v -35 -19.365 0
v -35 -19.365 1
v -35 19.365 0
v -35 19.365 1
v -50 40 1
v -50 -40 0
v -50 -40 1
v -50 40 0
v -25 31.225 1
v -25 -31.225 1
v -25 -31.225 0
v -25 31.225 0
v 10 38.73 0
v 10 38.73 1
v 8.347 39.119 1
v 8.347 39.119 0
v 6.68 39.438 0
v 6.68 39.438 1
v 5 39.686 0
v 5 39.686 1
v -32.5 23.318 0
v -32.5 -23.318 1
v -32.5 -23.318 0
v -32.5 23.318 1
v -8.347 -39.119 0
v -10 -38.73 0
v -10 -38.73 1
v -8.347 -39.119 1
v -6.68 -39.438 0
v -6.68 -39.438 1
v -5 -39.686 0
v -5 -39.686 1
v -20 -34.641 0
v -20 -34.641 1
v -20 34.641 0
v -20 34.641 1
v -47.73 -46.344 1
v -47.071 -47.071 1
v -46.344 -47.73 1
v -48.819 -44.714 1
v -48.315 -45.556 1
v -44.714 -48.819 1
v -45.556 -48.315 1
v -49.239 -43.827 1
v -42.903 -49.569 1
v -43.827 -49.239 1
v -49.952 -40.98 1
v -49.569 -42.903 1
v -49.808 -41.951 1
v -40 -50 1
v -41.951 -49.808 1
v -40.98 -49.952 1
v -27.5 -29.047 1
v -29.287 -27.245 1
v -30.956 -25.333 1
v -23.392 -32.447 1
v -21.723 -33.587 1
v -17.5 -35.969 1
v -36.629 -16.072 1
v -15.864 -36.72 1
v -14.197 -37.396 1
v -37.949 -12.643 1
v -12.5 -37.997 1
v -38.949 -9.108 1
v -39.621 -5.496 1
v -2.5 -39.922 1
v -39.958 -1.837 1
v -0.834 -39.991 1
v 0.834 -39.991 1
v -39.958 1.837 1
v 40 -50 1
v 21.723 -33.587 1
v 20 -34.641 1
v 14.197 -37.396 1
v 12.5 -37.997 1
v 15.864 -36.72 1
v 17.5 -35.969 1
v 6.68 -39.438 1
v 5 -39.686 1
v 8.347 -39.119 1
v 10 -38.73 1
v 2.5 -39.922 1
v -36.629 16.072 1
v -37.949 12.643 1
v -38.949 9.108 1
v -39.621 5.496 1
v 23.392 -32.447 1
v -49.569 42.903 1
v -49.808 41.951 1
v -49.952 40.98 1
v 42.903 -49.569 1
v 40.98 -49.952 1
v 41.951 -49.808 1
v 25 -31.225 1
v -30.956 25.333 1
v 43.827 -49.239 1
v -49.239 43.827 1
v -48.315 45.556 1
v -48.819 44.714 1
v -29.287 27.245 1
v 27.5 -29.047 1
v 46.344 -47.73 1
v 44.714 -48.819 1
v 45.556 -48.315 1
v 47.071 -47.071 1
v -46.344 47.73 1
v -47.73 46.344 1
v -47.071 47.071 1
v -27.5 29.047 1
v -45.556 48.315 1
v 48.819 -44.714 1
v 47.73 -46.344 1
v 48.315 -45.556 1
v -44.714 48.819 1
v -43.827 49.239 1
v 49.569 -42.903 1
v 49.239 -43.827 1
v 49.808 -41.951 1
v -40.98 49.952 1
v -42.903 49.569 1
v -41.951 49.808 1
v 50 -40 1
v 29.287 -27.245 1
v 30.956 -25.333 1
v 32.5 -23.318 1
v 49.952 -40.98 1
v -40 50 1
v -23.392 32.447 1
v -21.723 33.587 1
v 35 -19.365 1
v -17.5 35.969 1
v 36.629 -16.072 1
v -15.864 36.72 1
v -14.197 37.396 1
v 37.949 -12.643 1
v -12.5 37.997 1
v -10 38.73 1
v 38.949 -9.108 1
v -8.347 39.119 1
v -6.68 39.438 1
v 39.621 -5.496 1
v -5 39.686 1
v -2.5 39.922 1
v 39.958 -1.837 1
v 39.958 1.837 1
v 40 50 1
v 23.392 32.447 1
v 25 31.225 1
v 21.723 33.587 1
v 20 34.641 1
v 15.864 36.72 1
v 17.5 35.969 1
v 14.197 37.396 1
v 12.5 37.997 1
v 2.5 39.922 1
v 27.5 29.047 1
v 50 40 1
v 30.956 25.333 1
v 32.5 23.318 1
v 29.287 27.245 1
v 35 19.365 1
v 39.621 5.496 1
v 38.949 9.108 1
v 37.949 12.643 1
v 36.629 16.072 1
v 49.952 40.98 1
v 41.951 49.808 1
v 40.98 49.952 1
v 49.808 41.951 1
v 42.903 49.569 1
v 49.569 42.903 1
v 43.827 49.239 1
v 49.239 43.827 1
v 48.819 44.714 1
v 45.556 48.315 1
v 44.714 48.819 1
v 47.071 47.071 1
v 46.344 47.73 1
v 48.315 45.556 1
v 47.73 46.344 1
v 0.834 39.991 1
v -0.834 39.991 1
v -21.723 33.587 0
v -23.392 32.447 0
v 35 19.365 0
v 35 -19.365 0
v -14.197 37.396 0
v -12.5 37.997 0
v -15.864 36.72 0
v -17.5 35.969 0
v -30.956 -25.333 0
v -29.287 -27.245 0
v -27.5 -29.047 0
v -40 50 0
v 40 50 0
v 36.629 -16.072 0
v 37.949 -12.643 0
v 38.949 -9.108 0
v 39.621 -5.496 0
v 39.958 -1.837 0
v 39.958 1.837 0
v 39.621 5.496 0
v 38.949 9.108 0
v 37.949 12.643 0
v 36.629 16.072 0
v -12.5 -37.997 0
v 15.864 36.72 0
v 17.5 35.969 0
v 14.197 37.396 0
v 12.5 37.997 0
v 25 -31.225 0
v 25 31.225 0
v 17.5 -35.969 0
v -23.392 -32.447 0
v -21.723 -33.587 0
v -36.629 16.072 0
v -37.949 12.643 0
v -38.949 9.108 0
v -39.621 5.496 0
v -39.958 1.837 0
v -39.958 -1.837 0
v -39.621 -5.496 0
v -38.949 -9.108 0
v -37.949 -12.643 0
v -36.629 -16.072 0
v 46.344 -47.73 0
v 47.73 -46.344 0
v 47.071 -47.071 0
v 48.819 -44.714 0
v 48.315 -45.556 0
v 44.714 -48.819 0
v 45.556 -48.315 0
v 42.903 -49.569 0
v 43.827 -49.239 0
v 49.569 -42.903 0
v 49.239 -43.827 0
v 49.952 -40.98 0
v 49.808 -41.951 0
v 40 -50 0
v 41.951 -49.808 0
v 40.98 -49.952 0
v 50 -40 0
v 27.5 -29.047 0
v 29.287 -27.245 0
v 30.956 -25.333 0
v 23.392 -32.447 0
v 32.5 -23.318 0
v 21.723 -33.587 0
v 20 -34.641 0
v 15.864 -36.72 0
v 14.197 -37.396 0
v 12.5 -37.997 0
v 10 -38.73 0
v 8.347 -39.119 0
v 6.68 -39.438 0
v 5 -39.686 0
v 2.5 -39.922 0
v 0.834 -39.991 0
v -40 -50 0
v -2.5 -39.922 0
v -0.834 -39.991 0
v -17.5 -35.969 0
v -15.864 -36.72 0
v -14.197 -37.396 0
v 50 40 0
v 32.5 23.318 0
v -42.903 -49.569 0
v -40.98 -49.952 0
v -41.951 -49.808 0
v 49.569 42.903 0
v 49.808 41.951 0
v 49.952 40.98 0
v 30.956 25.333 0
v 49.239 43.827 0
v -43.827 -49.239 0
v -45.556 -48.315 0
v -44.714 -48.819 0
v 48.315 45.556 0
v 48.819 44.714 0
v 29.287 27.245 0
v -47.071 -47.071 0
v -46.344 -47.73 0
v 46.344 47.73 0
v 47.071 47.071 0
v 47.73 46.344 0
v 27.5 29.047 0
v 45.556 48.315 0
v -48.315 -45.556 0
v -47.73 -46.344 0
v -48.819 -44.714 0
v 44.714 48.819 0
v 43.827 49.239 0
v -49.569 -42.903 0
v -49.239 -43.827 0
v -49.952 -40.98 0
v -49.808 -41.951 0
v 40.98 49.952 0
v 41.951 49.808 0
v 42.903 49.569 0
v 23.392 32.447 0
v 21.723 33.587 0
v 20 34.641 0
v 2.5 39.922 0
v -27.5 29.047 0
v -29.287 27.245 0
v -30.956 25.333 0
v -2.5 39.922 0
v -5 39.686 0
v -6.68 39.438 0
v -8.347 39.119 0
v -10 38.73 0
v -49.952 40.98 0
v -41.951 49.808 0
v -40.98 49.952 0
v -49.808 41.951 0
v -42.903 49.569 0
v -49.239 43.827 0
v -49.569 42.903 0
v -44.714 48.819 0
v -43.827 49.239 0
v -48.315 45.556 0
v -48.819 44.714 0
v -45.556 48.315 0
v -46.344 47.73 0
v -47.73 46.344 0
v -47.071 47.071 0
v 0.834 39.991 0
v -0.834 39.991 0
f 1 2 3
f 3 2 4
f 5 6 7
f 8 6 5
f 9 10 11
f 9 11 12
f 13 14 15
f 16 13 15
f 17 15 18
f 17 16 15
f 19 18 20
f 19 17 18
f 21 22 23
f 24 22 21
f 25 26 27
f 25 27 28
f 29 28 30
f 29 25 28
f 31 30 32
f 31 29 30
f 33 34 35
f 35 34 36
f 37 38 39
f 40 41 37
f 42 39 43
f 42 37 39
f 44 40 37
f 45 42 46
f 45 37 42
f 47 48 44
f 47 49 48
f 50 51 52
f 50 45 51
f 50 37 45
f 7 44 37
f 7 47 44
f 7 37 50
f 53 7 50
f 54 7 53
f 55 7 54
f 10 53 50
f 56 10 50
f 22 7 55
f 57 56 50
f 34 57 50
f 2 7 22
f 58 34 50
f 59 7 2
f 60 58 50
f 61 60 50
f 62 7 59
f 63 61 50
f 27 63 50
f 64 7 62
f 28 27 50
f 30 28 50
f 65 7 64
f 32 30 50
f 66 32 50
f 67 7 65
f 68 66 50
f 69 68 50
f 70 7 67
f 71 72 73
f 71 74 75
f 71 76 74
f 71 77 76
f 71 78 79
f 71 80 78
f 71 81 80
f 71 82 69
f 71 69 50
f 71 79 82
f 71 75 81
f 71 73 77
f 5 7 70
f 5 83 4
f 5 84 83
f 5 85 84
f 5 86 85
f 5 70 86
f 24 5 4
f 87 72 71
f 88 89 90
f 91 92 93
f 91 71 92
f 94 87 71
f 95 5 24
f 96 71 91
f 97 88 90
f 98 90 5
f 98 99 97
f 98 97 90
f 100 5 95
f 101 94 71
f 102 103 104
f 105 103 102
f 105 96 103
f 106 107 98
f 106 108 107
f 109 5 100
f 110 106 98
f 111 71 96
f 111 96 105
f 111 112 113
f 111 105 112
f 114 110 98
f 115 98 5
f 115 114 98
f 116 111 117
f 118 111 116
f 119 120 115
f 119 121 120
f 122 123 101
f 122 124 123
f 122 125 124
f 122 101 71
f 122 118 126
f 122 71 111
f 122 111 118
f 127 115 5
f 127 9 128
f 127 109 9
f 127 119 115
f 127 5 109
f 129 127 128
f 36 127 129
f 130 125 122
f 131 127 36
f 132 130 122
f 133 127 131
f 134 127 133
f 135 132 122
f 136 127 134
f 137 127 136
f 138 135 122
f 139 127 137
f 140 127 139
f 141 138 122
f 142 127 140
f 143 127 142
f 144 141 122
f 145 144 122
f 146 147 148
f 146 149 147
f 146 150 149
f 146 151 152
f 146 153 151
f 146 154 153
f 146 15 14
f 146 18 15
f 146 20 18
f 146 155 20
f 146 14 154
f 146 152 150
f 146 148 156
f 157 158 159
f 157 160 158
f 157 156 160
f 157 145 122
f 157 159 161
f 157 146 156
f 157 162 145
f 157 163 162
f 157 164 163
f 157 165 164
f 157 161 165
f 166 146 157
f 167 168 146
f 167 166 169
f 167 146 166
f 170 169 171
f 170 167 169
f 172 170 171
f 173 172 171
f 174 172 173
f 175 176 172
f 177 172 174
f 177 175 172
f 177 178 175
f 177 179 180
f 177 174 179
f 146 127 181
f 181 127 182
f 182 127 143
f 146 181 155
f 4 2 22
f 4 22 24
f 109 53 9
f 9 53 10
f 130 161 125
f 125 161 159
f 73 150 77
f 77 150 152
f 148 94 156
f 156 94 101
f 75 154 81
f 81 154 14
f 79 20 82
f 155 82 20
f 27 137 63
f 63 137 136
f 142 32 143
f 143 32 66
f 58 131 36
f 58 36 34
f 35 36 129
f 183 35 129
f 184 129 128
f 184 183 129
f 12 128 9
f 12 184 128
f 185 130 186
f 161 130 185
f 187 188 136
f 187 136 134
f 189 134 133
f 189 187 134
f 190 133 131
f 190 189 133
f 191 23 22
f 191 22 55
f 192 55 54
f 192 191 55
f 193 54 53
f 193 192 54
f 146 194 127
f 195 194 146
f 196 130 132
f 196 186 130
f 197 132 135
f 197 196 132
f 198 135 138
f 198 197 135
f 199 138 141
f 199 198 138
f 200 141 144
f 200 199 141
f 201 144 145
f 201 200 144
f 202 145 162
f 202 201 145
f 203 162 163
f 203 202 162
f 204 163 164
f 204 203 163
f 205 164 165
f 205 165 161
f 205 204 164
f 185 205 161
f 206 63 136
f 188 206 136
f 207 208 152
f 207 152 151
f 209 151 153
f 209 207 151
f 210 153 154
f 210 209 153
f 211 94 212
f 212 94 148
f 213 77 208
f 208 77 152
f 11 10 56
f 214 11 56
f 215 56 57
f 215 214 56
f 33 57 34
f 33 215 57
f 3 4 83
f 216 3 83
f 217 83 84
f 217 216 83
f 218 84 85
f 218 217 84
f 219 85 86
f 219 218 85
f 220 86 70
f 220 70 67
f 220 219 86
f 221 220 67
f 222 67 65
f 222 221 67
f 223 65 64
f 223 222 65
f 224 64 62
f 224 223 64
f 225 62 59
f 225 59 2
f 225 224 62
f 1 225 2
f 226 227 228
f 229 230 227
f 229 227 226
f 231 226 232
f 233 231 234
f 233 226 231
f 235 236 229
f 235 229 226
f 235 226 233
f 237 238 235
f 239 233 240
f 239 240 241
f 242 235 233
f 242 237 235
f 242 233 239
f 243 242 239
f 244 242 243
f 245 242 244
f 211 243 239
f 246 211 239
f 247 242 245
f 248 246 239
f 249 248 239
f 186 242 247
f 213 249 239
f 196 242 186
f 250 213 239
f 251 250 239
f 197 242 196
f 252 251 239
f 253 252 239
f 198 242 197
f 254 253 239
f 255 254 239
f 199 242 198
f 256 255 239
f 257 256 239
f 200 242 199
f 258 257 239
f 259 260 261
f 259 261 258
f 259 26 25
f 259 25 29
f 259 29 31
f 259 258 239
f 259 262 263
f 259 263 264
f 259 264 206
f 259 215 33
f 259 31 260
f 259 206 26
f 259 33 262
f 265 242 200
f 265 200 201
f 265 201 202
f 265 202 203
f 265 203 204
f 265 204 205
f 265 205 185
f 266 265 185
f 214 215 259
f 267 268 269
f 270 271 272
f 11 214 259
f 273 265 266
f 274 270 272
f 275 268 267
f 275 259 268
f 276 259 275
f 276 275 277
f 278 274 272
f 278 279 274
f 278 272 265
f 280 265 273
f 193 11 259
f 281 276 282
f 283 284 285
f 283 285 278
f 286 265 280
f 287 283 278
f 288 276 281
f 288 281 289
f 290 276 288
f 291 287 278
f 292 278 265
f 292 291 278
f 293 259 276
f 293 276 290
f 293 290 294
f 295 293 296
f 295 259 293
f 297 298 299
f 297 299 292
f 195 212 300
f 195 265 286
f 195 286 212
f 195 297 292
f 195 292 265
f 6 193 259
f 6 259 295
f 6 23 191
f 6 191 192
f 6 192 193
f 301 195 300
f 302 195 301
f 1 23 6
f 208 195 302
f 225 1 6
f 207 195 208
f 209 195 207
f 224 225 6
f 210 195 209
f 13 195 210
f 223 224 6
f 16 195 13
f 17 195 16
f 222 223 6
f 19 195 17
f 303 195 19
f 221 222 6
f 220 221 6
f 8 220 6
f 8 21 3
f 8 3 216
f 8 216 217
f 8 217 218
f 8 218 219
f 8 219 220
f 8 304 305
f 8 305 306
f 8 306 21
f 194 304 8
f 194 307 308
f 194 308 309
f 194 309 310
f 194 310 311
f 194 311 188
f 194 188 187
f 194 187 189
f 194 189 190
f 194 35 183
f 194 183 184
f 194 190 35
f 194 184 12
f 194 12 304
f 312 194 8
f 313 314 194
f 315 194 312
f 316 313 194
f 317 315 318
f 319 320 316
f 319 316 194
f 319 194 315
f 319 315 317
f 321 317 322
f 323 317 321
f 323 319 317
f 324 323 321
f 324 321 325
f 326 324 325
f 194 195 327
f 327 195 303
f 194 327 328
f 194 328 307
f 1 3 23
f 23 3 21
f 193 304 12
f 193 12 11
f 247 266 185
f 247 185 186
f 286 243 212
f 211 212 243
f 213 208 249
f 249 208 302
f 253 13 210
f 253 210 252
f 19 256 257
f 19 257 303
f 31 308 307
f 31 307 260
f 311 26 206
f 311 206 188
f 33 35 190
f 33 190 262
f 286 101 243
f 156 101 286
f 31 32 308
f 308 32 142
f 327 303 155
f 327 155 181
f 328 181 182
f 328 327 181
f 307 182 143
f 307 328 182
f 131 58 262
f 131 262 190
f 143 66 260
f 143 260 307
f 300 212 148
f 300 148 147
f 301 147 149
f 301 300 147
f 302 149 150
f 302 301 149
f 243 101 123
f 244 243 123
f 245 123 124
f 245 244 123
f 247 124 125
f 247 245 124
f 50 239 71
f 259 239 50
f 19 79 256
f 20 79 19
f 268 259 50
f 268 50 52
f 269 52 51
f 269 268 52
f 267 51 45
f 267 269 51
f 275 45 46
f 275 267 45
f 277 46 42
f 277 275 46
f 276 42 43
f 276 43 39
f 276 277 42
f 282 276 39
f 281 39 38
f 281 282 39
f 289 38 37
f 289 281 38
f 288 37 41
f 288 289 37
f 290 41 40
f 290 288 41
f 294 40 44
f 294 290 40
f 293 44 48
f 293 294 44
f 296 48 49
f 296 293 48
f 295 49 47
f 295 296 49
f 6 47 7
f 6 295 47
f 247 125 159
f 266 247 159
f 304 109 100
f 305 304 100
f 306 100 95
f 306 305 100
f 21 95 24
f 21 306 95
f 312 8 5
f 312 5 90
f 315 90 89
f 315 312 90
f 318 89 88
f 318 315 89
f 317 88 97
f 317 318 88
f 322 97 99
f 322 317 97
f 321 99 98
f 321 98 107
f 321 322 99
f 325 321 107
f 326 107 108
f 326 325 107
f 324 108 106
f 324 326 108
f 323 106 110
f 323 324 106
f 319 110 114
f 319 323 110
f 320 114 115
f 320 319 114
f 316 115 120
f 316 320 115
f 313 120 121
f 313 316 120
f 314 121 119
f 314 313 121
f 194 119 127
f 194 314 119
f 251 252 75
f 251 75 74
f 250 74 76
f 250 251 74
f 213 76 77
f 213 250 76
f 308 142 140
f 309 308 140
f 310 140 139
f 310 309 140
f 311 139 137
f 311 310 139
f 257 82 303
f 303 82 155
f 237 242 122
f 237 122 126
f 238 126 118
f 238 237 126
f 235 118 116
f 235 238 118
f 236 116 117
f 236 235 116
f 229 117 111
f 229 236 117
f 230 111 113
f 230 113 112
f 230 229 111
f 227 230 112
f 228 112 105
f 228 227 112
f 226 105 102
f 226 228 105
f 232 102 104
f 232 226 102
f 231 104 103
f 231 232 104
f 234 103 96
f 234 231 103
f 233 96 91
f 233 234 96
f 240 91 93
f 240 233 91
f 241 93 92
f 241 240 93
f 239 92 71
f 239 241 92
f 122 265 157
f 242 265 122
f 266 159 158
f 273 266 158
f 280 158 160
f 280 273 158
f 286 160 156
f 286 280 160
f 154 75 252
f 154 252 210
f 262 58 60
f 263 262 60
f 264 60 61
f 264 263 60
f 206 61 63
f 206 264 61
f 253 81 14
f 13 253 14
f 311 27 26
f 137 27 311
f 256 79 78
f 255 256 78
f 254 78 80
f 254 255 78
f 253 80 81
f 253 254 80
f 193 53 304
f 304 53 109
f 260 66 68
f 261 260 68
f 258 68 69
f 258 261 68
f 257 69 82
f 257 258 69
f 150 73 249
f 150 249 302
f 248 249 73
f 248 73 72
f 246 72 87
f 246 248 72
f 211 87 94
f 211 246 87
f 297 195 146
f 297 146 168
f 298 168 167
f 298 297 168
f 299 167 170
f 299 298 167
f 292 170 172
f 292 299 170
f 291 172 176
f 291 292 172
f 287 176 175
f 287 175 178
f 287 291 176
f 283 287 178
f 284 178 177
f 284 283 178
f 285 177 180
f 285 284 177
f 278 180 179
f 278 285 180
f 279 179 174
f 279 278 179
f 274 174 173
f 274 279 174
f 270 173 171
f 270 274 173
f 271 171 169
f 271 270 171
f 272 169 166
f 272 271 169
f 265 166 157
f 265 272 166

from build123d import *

# Parameters (mm, degrees)
SKETCH1_R           = 40
BOSS_EXTRUDE1_DEPTH = 1
SKETCH3_W           = 2.5
SKETCH3_H           = 80
BOSS_EXTRUDE2_DEPTH = 1


with BuildPart() as part:
    # Sketch1 → Boss-Extrude1 (new body)
    with BuildSketch(Plane.XY):
        with BuildLine():
            Line((-40, 50), (40, 50))
            ThreePointArc((40, 50), (47.071067812, 47.071067812), (50, 40))
            Line((50, 40), (50, -40))
            ThreePointArc((50, -40), (47.071067812, -47.071067812), (40, -50))
            Line((40, -50), (-40, -50))
            ThreePointArc((-40, -50), (-47.071067812, -47.071067812), (-50, -40))
            Line((-50, -40), (-50, 40))
            ThreePointArc((-50, 40), (-47.071067812, 47.071067812), (-40, 50))
        make_face()
        Circle(SKETCH1_R, mode=Mode.SUBTRACT)
    extrude(amount=BOSS_EXTRUDE1_DEPTH)

    # Sketch3 → Boss-Extrude2 (add)
    with BuildSketch(Plane.XY.offset(1)):
        with Locations((-33.75, 0)):
            Rectangle(SKETCH3_W, SKETCH3_H)
        with Locations((-26.25, 0)):
            Rectangle(SKETCH3_W, SKETCH3_H)
        with Locations((-18.75, 0)):
            Rectangle(SKETCH3_W, SKETCH3_H)
        with Locations((-11.25, 0)):
            Rectangle(SKETCH3_W, SKETCH3_H)
        with Locations((-3.75, 0)):
            Rectangle(SKETCH3_W, SKETCH3_H)
        with Locations((3.75, 0)):
            Rectangle(SKETCH3_W, SKETCH3_H)
        with Locations((11.25, 0)):
            Rectangle(SKETCH3_W, SKETCH3_H)
        with Locations((18.75, 0)):
            Rectangle(SKETCH3_W, SKETCH3_H)
        with Locations((26.25, 0)):
            Rectangle(SKETCH3_W, SKETCH3_H)
        with Locations((33.75, 0)):
            Rectangle(SKETCH3_W, SKETCH3_H)
    extrude(amount=-BOSS_EXTRUDE2_DEPTH)


solid = part.part
